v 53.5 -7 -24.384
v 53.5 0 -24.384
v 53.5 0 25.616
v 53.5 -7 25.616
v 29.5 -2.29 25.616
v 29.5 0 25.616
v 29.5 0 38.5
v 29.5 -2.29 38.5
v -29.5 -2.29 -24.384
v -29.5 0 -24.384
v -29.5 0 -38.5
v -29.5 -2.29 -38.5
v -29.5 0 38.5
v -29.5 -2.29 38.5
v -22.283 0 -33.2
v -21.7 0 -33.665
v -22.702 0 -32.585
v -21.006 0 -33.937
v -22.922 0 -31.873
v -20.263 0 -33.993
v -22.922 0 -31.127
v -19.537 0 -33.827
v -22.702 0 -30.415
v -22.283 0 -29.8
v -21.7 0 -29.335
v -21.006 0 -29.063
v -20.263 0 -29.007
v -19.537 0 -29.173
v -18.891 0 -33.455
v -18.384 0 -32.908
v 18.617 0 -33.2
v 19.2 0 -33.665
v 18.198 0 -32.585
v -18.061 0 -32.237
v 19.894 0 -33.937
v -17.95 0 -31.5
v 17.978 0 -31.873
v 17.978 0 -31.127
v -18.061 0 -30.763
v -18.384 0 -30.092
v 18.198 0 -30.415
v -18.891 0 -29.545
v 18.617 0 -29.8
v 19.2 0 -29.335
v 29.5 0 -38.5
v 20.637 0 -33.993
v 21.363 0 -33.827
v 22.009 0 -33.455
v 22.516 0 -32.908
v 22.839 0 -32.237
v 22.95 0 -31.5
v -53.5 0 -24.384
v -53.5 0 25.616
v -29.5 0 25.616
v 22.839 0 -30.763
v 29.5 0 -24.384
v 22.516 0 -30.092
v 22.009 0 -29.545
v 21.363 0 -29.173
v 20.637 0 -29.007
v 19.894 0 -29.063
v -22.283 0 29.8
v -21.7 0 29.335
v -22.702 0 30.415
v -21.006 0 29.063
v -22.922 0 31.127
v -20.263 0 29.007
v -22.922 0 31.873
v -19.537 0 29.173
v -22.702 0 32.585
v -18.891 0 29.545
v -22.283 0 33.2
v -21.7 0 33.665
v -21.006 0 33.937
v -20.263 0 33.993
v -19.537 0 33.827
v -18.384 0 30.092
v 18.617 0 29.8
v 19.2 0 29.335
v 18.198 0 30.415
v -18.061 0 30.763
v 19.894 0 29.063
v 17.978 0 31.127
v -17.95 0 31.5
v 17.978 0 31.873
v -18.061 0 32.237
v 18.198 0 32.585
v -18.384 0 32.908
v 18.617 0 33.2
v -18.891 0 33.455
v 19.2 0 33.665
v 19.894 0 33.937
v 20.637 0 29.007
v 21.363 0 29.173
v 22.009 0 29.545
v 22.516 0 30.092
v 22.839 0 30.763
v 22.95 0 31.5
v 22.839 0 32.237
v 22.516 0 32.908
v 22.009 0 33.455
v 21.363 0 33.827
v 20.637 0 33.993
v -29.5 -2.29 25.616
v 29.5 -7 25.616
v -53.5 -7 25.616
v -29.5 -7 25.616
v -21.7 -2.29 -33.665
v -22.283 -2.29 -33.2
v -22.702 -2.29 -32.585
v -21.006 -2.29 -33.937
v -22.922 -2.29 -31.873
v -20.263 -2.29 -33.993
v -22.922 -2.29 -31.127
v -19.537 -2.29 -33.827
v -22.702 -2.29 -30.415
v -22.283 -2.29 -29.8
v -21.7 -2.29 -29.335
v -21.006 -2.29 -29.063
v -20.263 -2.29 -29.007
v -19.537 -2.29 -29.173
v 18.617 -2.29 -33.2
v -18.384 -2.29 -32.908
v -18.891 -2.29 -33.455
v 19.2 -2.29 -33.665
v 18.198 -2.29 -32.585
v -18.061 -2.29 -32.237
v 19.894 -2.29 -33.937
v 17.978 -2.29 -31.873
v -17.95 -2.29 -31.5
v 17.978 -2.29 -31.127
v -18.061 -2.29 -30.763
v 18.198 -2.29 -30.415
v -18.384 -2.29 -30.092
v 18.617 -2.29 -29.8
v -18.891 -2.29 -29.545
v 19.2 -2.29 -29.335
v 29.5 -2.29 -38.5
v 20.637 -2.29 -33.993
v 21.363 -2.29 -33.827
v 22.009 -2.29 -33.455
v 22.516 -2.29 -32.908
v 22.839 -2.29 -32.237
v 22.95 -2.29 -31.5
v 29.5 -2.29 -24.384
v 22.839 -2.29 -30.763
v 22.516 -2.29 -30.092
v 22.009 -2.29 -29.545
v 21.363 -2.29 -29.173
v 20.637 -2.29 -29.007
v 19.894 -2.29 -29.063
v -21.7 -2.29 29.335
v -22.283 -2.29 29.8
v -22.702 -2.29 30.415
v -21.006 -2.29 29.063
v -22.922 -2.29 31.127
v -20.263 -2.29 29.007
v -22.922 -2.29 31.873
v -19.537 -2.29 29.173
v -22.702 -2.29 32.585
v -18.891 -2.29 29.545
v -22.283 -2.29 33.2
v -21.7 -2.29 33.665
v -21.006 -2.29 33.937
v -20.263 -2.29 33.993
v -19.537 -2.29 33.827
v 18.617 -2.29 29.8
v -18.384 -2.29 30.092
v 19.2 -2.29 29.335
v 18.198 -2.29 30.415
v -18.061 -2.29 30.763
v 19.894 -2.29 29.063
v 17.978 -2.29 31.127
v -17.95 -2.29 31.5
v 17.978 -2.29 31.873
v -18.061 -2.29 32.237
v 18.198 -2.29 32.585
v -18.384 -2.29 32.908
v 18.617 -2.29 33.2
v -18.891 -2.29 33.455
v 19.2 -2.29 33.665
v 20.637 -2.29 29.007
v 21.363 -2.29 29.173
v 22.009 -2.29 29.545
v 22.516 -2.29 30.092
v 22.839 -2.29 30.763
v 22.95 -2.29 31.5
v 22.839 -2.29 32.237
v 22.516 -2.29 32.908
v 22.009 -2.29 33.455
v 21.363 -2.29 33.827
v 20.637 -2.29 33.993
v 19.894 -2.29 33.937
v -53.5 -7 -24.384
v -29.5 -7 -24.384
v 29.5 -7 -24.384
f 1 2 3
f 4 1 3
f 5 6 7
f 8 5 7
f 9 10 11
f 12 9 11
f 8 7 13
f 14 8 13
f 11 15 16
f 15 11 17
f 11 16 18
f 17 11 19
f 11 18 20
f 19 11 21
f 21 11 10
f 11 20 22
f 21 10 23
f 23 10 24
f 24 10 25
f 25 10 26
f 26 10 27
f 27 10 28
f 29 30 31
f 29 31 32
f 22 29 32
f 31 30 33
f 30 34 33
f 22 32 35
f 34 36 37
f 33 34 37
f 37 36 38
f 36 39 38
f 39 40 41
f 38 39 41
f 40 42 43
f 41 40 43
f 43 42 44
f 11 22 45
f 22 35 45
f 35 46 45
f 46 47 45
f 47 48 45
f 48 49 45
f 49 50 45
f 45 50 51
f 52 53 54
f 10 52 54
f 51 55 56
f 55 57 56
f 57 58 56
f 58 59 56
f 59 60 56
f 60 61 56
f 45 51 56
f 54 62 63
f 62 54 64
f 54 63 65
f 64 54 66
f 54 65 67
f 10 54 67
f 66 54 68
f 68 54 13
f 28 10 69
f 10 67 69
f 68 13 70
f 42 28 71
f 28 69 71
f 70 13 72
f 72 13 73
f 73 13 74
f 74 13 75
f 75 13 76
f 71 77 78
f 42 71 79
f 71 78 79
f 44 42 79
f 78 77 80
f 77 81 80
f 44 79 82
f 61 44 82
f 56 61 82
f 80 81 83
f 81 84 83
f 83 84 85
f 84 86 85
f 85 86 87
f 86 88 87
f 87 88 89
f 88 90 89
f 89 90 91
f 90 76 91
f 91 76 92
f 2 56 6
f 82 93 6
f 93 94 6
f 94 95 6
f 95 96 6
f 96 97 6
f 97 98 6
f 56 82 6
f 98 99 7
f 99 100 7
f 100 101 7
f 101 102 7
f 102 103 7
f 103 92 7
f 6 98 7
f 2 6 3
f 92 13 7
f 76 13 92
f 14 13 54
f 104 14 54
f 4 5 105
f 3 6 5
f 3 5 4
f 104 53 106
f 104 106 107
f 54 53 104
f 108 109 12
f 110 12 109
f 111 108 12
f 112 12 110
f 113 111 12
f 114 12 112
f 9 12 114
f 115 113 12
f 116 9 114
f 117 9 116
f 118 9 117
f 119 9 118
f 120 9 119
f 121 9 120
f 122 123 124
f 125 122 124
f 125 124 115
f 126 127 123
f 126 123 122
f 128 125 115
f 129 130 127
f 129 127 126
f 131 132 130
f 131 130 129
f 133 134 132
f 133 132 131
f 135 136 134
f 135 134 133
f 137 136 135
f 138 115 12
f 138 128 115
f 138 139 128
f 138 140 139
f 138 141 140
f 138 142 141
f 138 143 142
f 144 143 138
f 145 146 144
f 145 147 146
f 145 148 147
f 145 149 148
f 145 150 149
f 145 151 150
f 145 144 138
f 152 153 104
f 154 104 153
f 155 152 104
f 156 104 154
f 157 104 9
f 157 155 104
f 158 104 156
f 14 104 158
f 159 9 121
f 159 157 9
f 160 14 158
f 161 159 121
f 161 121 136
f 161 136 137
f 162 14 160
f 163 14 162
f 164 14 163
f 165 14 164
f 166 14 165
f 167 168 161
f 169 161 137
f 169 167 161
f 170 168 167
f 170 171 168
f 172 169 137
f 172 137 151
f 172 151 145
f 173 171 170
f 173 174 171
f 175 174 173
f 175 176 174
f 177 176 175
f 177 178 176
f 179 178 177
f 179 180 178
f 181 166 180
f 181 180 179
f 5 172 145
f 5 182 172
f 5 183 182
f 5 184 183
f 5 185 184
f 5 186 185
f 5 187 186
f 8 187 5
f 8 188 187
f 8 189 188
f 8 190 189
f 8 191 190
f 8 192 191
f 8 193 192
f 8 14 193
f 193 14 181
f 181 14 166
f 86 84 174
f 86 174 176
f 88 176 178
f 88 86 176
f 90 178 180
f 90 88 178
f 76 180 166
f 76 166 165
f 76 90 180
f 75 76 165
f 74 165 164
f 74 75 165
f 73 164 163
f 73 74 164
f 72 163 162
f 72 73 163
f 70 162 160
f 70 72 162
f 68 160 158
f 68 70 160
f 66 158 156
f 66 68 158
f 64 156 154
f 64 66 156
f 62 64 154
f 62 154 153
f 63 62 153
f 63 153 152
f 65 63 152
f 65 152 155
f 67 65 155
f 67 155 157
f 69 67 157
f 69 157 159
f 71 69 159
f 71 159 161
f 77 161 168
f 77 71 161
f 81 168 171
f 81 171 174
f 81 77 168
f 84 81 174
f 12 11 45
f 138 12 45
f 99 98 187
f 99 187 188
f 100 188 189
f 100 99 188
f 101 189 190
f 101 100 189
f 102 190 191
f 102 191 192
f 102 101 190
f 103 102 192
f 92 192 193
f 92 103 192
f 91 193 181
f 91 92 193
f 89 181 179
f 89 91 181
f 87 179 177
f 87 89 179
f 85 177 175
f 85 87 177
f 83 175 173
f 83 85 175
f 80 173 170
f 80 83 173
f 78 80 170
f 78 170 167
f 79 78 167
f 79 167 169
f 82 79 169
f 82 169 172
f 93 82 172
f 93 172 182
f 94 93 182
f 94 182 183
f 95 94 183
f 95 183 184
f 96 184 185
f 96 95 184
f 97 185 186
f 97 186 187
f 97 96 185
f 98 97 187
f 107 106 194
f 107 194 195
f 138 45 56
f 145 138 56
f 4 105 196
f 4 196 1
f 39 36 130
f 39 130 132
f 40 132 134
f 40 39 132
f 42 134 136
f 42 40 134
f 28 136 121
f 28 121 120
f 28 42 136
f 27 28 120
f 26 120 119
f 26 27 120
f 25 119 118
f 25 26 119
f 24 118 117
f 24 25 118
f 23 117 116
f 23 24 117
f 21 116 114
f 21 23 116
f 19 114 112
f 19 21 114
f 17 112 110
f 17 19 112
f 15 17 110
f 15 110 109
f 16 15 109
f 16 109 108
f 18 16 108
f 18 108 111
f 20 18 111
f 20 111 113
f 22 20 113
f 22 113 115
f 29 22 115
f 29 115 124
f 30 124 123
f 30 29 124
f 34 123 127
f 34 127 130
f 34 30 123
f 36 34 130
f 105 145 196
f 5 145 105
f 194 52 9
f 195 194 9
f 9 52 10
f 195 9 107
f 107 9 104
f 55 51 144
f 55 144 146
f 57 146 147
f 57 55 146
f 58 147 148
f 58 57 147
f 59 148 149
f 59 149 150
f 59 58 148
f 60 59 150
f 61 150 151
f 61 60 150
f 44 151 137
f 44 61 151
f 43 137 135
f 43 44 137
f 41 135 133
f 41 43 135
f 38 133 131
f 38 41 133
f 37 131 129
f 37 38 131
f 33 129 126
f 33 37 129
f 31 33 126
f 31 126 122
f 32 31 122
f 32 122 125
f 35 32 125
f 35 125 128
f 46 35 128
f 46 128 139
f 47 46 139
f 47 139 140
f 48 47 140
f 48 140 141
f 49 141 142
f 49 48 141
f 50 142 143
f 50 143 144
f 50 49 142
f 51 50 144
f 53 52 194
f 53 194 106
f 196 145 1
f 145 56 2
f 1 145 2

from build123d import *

# Parameters (mm, degrees)
F0_R     = 2.5
F1_DEPTH = 2.29
F0_W     = 24
F0_H     = 50
F2_DEPTH = 7


with BuildPart() as f1:
    # F0 (on Front) → F1 (new body)
    with BuildSketch(Plane.XZ):
        Polygon((-29.5, -38.5), (29.5, -38.5), (29.5, -24.384001), (29.5, 25.615999), (29.5, 38.5), (-29.5, 38.5), (-29.5, 25.615999), (-29.5, -24.384001), align=None)
        with Locations((-20.45, -31.5)):
            Circle(F0_R, mode=Mode.SUBTRACT)
        with Locations((20.45, -31.5)):
            Circle(F0_R, mode=Mode.SUBTRACT)
        with Locations((-20.45, 31.5)):
            Circle(F0_R, mode=Mode.SUBTRACT)
        with Locations((20.45, 31.5)):
            Circle(F0_R, mode=Mode.SUBTRACT)
    extrude(amount=F1_DEPTH)

    # F0 (on Front) → F2 (join)
    with BuildSketch(Plane.XZ):
        with Locations((41.5, 0.615999)):
            Rectangle(F0_W, F0_H)
        with Locations((-41.5, 0.615999)):
            Rectangle(F0_W, F0_H)
    extrude(amount=F2_DEPTH)


solid = f1.part
